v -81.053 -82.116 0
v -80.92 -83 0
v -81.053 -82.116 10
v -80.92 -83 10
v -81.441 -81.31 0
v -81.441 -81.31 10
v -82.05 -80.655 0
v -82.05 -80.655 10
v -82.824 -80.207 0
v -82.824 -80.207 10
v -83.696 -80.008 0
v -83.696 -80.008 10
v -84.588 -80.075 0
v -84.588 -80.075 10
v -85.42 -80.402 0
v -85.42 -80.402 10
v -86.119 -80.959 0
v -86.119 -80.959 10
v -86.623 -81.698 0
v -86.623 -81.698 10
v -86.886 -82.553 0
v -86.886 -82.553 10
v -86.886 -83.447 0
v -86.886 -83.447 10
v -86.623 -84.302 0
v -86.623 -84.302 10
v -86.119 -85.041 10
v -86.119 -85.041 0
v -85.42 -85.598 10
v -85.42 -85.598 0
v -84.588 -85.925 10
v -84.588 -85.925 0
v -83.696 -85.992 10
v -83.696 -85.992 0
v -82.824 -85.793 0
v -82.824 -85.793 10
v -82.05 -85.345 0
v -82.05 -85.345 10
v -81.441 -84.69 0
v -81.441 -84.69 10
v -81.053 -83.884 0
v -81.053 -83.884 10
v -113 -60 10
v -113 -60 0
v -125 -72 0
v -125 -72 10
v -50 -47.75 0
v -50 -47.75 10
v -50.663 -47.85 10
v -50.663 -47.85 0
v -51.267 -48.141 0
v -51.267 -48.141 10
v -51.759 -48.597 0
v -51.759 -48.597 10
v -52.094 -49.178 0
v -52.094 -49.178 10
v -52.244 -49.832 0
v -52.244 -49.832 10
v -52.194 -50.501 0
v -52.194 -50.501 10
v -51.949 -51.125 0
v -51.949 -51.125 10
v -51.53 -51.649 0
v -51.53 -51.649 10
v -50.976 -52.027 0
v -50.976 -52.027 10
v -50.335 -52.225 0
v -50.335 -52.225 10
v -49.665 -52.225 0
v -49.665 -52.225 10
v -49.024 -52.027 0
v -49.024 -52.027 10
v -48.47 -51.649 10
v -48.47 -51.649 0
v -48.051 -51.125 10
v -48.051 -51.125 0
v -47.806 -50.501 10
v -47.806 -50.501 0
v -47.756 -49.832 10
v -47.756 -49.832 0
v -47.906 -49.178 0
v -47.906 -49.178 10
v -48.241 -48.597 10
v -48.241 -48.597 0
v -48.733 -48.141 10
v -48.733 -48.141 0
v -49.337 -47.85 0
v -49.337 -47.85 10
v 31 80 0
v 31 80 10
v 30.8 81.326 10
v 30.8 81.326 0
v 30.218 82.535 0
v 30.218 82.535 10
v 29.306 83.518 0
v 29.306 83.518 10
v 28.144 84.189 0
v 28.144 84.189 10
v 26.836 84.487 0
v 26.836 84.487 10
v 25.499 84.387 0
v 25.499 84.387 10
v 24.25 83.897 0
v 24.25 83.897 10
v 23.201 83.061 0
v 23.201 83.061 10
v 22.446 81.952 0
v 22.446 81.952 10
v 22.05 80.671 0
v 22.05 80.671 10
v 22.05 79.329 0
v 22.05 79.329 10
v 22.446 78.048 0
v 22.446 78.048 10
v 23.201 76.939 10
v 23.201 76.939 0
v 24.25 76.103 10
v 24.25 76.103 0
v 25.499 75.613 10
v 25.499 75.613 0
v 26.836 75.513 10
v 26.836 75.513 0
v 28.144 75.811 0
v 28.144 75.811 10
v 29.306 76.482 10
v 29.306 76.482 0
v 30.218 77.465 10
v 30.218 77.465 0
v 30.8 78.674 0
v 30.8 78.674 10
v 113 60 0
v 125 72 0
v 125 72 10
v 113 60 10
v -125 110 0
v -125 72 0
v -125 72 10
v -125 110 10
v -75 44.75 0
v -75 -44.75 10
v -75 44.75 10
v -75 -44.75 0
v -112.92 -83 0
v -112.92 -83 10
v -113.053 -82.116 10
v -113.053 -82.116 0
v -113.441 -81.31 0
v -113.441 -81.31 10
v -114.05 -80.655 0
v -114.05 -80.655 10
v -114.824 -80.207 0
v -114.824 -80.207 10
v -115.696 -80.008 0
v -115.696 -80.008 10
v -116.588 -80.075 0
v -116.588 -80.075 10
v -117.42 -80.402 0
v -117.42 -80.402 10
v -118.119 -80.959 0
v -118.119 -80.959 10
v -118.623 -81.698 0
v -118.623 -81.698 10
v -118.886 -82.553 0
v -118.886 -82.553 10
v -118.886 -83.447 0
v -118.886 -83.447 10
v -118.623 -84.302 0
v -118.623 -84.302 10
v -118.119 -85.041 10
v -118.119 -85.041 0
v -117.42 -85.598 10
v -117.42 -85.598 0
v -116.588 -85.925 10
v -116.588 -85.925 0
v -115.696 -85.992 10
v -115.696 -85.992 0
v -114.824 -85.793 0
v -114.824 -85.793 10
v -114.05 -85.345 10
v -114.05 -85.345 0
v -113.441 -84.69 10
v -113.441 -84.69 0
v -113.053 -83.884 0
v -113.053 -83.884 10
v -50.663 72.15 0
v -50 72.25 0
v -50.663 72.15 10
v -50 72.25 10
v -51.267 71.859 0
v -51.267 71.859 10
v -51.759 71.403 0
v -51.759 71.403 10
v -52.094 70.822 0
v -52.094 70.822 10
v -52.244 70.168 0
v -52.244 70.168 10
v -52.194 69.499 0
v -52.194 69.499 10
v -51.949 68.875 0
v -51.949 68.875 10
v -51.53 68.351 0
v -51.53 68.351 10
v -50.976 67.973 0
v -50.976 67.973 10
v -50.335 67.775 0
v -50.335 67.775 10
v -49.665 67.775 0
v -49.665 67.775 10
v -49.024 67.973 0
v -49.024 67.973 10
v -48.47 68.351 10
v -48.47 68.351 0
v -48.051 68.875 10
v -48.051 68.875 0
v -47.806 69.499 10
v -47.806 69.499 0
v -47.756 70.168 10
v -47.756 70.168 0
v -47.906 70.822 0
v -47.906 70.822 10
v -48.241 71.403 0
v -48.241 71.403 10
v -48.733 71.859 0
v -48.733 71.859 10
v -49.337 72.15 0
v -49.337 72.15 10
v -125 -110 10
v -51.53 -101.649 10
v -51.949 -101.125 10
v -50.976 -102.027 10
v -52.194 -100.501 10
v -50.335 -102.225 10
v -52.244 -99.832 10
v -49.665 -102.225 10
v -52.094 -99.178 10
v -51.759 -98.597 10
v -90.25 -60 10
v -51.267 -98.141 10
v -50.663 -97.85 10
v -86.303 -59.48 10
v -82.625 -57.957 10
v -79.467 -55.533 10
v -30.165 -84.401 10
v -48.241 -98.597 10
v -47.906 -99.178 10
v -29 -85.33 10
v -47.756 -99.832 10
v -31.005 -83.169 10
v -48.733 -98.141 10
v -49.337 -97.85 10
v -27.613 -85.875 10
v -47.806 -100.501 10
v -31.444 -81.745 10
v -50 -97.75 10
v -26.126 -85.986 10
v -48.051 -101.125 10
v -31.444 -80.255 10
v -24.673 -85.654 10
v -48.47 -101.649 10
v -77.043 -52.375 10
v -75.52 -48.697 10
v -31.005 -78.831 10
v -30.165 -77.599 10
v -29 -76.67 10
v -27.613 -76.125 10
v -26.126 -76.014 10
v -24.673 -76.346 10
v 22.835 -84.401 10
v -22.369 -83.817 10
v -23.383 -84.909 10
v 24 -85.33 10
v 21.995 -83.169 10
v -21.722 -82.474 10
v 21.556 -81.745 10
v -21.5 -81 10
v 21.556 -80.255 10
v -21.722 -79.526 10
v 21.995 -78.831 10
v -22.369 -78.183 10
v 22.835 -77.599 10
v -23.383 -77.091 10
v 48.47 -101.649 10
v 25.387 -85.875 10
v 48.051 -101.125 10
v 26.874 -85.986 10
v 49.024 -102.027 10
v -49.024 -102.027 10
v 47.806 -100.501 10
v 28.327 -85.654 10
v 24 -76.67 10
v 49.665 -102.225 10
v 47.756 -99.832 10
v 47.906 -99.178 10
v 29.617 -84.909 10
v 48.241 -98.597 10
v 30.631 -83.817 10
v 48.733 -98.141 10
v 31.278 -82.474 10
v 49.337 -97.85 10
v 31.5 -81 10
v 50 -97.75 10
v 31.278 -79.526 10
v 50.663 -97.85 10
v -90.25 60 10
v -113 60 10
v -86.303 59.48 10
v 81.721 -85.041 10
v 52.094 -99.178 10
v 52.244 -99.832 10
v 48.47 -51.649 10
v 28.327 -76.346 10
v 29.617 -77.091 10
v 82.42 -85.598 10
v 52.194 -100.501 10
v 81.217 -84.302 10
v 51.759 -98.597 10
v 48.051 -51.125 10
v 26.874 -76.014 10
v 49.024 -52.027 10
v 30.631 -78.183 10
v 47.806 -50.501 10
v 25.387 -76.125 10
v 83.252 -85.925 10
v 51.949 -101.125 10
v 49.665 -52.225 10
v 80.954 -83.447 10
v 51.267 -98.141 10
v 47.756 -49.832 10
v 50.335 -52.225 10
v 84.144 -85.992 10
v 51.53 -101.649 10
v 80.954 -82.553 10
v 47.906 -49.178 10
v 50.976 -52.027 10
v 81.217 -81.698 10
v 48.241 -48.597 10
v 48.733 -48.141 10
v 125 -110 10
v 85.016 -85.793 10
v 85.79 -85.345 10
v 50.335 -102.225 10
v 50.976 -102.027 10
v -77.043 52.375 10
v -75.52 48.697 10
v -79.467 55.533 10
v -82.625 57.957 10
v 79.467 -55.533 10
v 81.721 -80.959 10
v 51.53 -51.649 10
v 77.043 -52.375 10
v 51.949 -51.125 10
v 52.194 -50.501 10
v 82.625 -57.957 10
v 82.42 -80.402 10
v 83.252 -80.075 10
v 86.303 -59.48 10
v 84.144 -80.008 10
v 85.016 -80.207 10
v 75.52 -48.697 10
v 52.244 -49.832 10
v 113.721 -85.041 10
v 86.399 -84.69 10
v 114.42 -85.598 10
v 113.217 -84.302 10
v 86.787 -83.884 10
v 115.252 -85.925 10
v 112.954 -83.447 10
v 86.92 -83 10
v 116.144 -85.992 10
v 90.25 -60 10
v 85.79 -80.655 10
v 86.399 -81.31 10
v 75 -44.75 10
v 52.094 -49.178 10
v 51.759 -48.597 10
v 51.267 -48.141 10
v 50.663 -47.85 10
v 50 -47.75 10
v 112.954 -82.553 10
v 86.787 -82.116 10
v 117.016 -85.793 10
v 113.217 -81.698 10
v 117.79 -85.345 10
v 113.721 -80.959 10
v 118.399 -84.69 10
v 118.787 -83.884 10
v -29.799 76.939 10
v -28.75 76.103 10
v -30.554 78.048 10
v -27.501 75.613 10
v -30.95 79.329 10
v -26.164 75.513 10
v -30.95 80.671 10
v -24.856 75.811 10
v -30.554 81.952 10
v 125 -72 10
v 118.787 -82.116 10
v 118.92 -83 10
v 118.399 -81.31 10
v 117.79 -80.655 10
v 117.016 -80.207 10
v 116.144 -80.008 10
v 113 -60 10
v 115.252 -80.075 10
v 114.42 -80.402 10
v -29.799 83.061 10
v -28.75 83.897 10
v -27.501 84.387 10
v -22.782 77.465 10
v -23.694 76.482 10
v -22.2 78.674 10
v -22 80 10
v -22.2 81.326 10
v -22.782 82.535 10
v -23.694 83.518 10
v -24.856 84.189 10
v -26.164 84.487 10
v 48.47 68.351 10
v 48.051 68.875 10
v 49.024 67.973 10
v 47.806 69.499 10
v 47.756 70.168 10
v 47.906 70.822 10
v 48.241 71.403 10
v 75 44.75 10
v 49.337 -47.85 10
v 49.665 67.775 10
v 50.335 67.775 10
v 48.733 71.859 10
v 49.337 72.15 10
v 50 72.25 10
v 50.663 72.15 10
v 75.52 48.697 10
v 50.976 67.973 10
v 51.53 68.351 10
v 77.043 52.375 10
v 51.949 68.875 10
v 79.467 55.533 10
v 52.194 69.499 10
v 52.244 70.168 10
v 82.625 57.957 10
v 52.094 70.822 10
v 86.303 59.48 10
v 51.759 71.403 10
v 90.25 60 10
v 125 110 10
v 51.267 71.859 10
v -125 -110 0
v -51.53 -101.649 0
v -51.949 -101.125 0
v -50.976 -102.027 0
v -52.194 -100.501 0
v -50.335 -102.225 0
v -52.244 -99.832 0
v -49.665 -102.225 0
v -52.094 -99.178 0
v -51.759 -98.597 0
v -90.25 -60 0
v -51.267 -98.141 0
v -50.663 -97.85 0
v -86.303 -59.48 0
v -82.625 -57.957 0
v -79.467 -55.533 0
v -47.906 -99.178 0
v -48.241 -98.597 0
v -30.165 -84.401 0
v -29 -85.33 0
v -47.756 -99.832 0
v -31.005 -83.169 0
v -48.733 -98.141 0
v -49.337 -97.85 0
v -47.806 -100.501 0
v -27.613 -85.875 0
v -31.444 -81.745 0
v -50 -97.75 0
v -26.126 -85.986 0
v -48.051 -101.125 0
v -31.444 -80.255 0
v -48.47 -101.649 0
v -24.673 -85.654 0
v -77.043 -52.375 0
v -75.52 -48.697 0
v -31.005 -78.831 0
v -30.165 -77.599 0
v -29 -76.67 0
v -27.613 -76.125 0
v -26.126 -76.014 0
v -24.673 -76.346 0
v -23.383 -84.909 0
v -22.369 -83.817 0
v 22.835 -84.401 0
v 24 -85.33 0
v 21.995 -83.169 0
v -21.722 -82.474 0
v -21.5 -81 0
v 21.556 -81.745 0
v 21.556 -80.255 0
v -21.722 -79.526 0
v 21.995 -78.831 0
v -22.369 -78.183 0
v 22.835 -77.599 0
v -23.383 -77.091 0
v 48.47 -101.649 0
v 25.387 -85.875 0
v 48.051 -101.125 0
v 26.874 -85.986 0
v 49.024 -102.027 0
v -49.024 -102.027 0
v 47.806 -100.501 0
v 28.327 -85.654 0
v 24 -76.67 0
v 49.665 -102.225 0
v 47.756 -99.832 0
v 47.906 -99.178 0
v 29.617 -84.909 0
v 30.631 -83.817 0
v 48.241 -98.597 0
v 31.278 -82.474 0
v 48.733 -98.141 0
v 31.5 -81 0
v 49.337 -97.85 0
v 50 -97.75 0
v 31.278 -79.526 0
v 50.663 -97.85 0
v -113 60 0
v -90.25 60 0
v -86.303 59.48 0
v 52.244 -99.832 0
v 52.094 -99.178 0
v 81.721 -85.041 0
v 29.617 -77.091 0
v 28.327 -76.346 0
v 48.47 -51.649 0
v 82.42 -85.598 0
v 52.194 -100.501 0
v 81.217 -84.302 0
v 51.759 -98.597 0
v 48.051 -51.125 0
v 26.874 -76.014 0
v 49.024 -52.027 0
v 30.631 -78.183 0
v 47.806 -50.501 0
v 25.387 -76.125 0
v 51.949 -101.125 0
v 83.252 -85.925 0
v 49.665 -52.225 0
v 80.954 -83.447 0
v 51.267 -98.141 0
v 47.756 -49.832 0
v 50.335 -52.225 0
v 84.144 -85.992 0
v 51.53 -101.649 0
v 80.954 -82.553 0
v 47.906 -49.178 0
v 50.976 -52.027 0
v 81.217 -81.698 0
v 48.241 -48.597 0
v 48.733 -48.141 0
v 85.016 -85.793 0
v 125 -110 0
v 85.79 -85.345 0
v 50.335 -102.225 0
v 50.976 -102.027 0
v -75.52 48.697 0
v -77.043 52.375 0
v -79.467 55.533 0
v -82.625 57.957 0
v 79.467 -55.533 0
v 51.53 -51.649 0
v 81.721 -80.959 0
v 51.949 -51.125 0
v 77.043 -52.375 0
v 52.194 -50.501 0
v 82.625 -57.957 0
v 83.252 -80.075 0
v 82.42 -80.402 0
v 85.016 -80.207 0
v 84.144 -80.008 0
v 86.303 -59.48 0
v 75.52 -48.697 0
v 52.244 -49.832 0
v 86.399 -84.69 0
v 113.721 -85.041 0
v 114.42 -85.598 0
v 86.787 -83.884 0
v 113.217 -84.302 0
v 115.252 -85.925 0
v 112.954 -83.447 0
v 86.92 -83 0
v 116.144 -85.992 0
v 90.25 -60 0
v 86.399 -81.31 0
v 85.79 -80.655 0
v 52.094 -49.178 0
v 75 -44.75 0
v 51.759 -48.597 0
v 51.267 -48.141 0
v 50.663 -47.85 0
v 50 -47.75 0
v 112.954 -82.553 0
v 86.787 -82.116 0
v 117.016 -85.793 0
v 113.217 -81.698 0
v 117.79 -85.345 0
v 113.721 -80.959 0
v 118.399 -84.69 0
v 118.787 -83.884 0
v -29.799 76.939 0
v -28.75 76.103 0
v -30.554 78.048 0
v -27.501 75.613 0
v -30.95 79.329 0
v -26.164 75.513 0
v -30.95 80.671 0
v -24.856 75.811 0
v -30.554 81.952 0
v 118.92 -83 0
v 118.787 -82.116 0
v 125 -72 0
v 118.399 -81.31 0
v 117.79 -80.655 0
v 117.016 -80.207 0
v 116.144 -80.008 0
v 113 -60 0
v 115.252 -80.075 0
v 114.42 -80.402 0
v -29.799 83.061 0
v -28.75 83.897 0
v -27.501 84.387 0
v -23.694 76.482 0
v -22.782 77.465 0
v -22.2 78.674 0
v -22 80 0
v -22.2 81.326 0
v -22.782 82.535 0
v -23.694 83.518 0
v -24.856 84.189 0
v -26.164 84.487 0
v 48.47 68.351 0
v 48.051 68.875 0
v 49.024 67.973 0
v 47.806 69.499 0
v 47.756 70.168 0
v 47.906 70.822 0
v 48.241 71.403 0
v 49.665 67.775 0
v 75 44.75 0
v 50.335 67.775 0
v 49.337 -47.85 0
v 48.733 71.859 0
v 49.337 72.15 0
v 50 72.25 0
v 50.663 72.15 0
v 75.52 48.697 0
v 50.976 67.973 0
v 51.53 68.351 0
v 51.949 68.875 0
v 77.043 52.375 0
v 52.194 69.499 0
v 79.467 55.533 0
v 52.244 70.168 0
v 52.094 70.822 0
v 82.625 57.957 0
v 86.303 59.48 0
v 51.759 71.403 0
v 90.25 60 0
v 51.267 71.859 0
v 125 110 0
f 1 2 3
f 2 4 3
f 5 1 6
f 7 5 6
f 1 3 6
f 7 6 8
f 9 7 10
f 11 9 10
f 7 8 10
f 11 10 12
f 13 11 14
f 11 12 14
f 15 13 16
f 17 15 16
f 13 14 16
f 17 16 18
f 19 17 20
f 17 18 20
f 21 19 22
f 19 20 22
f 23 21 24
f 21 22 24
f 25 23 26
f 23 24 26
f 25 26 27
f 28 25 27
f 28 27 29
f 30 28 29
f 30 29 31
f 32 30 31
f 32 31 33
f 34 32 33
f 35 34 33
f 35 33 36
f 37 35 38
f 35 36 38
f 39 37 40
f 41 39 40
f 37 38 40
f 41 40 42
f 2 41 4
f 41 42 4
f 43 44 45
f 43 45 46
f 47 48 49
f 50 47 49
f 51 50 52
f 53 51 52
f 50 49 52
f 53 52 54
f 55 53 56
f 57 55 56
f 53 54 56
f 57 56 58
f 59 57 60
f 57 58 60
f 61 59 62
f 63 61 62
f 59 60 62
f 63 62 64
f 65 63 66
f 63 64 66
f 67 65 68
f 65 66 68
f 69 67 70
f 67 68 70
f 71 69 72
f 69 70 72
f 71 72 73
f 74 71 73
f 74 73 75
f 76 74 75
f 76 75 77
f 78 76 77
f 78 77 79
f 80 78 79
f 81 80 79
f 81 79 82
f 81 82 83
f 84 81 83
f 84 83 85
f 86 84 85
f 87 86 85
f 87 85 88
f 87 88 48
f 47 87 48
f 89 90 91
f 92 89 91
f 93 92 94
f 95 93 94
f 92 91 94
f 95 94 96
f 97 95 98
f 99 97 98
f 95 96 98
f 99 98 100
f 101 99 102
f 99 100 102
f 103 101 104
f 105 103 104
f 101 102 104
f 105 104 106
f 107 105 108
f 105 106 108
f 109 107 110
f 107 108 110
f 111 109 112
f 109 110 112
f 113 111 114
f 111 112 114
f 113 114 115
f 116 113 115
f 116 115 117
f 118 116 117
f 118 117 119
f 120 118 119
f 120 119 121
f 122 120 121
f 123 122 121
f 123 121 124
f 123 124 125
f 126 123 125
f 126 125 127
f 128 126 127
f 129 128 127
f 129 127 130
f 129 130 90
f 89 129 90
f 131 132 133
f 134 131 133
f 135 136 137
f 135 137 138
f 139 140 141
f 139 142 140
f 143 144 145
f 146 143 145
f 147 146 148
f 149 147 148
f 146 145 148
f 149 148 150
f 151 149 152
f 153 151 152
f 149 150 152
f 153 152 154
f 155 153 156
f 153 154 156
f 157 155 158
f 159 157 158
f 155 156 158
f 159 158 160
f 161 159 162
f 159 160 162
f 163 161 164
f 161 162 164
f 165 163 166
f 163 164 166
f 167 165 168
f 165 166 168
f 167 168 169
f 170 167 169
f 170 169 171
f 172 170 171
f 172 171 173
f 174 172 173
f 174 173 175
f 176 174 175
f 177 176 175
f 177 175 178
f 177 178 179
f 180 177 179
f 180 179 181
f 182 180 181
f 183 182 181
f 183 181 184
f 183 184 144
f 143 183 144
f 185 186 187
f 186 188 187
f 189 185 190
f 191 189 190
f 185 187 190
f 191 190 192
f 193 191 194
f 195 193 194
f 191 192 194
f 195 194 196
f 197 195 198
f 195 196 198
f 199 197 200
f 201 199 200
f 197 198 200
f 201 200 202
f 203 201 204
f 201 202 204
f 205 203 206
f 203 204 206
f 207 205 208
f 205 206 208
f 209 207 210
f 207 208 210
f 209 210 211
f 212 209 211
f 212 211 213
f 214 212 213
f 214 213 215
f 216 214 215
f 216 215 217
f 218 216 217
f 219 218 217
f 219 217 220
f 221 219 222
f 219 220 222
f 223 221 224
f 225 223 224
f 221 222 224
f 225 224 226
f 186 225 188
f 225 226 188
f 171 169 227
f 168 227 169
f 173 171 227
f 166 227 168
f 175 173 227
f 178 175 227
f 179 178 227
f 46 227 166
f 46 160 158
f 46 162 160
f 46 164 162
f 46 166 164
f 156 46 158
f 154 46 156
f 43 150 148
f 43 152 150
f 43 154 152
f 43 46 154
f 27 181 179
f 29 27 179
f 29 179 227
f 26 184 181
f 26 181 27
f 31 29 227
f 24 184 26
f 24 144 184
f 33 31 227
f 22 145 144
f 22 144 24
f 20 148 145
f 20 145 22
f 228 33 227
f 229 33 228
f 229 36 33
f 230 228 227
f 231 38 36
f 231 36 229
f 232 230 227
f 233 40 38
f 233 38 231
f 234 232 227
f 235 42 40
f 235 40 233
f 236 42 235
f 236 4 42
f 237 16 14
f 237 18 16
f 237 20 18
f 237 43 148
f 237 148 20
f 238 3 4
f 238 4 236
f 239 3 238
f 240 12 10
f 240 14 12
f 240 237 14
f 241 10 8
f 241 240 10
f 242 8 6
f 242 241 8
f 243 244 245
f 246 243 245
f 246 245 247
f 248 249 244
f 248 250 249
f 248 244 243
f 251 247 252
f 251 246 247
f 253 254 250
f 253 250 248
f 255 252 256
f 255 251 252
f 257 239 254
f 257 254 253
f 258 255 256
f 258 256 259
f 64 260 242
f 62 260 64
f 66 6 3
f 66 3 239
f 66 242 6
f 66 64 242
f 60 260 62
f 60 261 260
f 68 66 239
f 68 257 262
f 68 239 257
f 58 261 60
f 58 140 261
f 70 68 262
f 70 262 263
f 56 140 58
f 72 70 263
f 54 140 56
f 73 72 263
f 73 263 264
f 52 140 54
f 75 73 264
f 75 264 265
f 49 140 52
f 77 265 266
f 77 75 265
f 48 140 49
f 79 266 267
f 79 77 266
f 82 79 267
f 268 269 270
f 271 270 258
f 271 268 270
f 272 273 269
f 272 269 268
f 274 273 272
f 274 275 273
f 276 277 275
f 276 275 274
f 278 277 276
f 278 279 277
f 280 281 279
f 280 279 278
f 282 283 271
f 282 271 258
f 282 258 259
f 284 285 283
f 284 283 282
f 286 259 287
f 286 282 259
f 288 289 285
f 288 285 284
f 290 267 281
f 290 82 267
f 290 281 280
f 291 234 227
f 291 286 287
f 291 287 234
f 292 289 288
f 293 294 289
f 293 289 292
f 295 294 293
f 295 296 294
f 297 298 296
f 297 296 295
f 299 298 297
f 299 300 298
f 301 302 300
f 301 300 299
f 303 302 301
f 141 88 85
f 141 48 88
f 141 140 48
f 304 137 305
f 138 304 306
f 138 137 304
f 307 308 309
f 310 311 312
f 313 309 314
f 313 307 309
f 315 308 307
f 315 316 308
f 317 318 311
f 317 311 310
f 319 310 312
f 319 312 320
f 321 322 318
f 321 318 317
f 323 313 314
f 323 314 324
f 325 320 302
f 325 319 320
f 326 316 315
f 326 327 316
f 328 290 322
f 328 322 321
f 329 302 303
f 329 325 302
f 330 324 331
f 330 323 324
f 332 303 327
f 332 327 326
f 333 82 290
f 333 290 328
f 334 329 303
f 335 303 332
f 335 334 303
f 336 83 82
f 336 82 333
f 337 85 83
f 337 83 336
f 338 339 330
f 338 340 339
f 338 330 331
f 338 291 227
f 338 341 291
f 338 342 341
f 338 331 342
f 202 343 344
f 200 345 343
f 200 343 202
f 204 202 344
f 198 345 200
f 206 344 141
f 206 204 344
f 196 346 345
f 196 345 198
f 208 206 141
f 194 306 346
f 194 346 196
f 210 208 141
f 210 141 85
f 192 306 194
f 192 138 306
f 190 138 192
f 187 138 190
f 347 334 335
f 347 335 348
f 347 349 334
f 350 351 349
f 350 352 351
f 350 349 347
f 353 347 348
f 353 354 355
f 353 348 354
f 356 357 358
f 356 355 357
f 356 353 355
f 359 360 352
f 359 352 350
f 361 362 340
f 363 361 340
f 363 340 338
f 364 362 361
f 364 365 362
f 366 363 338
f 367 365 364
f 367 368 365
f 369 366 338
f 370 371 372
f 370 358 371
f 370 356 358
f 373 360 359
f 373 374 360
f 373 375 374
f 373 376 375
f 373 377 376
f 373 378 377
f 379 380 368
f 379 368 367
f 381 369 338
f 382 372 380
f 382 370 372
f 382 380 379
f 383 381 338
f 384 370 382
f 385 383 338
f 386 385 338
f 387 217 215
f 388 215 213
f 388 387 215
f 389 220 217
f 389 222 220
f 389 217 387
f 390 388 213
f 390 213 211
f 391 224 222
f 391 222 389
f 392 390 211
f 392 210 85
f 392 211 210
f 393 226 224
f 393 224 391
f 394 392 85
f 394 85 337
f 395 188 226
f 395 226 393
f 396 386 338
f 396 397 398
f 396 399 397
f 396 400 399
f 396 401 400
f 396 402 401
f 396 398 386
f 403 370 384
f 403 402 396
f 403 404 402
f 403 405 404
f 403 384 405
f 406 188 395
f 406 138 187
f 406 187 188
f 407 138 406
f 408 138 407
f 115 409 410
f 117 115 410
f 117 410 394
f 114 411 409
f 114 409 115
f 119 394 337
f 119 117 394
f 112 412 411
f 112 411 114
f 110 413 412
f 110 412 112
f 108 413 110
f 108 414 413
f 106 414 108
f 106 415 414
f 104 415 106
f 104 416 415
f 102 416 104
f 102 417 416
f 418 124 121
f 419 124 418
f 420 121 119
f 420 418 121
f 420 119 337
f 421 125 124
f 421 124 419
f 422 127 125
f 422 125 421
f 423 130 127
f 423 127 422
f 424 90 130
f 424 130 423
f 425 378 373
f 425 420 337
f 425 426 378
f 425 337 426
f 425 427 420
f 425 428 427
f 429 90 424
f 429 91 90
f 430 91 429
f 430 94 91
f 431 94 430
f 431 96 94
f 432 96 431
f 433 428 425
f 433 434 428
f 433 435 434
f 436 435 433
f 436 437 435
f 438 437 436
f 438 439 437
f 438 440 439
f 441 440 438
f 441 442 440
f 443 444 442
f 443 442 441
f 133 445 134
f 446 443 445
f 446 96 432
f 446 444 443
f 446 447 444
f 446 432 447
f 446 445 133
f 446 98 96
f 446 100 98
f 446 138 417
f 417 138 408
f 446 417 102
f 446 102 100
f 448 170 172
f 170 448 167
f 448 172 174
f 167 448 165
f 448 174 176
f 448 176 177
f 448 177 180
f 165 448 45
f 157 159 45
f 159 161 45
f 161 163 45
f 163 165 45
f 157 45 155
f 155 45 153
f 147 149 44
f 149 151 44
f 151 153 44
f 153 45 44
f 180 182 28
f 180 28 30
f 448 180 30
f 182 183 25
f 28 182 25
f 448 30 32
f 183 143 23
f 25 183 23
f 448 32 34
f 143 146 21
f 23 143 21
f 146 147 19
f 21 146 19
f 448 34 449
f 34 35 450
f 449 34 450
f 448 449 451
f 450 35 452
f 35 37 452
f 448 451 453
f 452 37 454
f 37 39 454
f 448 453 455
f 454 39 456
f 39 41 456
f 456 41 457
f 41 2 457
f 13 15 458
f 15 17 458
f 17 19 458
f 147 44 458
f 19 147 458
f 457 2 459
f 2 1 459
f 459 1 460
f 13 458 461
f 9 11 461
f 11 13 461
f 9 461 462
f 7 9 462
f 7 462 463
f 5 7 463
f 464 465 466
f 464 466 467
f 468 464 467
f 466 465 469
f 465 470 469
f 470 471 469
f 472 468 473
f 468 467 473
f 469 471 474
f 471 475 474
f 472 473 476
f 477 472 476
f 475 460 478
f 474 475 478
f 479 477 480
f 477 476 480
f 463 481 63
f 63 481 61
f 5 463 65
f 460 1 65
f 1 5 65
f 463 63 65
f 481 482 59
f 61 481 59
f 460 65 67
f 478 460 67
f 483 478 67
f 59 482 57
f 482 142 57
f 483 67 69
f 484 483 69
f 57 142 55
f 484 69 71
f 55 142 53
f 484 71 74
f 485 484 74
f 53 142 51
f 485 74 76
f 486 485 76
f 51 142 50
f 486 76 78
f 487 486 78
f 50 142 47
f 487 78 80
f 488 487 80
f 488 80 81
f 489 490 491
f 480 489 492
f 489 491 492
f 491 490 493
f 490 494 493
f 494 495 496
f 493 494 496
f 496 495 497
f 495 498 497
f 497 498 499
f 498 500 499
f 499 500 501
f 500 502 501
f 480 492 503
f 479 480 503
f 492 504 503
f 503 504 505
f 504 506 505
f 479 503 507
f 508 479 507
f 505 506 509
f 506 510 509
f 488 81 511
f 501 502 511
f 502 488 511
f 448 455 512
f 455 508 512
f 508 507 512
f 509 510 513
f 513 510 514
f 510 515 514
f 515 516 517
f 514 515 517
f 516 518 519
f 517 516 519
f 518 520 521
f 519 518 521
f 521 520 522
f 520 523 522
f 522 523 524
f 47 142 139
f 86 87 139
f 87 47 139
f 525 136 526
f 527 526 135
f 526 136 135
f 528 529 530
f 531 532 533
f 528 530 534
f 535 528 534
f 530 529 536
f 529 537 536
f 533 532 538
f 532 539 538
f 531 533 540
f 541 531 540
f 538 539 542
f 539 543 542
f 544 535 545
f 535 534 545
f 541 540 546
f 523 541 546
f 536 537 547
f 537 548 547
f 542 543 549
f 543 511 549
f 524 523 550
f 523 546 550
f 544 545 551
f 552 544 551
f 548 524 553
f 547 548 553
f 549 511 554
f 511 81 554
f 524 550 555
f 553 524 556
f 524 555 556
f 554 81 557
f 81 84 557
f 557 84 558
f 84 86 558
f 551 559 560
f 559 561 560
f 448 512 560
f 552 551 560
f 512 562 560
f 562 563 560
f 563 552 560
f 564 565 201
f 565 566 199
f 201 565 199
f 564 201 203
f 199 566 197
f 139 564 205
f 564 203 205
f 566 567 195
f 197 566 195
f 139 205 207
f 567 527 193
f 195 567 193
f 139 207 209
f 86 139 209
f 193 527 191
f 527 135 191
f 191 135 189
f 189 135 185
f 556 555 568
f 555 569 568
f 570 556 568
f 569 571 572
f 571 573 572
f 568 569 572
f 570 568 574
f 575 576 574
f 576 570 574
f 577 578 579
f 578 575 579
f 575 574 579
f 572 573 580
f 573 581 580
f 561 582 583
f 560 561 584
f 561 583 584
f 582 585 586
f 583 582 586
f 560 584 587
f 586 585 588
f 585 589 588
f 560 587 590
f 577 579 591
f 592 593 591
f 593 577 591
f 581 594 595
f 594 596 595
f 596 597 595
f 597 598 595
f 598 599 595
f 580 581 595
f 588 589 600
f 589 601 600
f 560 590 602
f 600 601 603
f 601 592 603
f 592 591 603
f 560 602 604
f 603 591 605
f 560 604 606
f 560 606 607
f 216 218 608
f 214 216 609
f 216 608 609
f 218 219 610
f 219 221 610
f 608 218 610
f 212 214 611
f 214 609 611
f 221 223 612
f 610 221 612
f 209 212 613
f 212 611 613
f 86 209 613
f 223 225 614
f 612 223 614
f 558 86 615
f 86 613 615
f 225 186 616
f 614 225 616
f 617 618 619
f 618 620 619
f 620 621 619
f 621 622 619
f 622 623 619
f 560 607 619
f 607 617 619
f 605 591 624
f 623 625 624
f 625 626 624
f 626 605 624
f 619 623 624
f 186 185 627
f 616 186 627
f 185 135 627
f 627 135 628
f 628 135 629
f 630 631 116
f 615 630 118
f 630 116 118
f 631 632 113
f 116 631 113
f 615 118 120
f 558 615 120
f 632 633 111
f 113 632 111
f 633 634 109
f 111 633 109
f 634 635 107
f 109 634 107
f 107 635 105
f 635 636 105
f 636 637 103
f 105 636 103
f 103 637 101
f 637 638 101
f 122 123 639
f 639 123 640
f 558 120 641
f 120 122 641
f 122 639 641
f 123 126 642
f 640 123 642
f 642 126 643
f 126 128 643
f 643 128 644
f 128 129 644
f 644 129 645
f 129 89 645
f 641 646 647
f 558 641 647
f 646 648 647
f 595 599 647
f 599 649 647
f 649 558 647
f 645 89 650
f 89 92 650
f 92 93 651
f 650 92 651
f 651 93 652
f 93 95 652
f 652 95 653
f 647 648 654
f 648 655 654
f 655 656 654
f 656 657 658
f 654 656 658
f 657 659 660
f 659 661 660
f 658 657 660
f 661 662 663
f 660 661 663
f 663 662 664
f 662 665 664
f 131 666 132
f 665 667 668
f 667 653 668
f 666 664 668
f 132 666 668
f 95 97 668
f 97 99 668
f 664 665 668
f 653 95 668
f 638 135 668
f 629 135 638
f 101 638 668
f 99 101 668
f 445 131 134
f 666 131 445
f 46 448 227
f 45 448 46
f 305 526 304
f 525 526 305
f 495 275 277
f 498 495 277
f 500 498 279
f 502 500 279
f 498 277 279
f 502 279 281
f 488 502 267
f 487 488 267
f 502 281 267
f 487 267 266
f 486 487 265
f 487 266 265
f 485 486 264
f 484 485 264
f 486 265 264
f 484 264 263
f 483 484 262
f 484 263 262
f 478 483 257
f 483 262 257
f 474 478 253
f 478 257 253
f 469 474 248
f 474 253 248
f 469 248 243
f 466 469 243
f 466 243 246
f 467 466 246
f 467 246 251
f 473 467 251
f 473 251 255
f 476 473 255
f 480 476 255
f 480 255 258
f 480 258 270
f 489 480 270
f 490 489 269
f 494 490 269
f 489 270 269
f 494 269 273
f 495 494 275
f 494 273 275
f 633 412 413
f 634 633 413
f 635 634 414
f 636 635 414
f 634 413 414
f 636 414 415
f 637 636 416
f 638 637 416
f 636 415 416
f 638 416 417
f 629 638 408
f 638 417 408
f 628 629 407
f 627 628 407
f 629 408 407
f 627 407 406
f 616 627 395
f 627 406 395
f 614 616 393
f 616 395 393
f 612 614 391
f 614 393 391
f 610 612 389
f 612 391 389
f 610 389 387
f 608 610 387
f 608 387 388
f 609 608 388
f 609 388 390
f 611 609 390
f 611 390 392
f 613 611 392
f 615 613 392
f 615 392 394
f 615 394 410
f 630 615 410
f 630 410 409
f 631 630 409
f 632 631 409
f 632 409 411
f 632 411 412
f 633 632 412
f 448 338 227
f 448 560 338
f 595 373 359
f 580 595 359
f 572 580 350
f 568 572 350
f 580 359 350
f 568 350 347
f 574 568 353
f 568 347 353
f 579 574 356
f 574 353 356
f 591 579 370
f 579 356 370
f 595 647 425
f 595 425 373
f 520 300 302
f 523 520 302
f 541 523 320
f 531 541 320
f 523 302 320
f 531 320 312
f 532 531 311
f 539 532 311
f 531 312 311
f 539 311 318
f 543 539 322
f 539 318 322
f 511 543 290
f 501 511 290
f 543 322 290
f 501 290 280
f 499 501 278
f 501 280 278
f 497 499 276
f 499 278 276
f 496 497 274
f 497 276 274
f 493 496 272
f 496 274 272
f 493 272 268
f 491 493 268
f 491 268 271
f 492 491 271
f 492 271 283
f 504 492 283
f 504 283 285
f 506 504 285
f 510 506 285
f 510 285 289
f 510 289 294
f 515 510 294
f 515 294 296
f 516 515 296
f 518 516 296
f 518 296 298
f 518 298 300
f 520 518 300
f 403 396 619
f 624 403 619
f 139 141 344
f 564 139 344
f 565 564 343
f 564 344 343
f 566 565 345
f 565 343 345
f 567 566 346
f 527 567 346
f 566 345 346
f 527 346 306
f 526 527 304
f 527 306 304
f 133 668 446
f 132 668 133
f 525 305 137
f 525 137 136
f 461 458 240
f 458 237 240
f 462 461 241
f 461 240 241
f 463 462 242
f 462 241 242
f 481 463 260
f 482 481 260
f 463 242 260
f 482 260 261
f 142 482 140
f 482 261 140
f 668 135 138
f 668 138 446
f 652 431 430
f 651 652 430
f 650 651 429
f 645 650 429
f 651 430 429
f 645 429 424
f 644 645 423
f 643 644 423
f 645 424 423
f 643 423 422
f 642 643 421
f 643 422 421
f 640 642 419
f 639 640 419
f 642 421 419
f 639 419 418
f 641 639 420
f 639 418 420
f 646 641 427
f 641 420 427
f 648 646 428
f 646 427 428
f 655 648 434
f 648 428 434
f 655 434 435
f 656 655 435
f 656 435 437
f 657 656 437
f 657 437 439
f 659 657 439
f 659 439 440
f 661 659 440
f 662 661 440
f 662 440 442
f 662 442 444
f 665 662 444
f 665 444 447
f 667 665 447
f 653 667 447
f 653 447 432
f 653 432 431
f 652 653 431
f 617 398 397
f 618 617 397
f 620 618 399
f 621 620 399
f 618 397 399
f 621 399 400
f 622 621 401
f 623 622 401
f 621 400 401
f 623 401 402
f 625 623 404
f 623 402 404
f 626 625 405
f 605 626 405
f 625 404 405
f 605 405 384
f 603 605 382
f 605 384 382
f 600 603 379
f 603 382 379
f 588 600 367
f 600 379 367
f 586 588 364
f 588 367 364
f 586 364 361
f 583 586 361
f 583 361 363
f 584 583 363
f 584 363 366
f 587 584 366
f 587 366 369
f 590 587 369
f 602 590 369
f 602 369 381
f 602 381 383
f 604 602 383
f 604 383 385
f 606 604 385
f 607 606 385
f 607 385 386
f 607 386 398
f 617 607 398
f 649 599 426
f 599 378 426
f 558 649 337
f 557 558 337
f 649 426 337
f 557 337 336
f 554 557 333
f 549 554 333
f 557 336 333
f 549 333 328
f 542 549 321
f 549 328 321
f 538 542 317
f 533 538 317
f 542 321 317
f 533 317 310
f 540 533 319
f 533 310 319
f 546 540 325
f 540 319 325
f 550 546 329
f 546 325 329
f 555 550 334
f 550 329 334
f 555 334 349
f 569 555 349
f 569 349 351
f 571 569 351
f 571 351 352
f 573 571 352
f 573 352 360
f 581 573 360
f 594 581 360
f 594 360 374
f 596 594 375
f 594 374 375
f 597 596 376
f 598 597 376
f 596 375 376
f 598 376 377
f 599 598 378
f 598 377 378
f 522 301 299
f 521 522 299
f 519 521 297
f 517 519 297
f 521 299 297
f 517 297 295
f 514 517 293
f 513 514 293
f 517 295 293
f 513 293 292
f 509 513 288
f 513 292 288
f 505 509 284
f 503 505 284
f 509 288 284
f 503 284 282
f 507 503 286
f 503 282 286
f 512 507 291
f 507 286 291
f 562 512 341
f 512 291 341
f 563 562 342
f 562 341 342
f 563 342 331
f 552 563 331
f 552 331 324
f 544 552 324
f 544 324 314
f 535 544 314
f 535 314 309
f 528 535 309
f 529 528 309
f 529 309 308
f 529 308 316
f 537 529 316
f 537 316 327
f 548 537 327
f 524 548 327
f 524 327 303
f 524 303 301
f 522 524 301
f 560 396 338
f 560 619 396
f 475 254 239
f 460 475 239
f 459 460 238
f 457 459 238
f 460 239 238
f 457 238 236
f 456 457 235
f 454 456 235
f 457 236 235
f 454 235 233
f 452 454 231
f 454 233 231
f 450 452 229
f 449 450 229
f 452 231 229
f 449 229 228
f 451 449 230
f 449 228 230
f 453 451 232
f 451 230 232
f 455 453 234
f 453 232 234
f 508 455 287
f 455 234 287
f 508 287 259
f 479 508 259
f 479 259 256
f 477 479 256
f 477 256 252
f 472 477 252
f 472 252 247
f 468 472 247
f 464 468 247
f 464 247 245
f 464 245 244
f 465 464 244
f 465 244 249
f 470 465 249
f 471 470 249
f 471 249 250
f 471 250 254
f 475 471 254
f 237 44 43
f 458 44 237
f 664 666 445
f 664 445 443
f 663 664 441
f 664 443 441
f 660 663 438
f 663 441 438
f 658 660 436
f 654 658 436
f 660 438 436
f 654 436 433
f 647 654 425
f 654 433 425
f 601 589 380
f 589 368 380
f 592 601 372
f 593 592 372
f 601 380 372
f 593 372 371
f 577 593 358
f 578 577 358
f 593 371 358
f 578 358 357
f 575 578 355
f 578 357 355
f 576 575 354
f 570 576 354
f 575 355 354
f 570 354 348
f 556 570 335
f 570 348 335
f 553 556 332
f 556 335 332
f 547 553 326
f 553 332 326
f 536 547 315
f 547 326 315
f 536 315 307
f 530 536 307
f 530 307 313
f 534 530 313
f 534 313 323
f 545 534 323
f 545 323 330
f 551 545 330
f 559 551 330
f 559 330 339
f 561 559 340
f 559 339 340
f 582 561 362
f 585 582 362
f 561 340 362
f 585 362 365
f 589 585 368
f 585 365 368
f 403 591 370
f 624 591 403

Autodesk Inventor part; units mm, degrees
ref_plane "YZ Plane" through (0, 0, 0) normal (1, 0, 0) x (0, 1, 0)
ref_plane "XZ Plane" through (0, 0, 0) normal (0, 1, 0) x (-1, 0, 0)
ref_plane "XY Plane" through (0, 0, 0) normal (0, 0, 1) x (1, 0, 0)
sketch "Sketch1" plane through (0, 0, 0) normal (0, 0, 1) x (1, 0, 0)
  line L0 (-125, -110) -> (-125, 110)
  line L1 (-125, 110) -> (125, 110)
  line L2 (125, 110) -> (125, -110)
  line L3 (125, -110) -> (-125, -110)
  line L4 (-125, -110) -> (125, 110) construction
  line L5 (-125, 110) -> (125, -110) construction
  point P0 (0, 0)
  dimension "d0" = 220
  dimension "d1" = 250
extrude "Extrusion1" add sketch "Sketch1" along normal blind 10
sketch "Sketch2" plane through (0, 0, 0) normal (0, 0, -1) x (-1, 0, 0)
  line L0 (50, 100) -> (-50, 100)
  line L1 (-50, 100) -> (-50, -100)
  line L2 (-50, -100) -> (50, -100)
  line L3 (50, -100) -> (50, 100)
  line L4 (50, 100) -> (-50, -100) construction
  line L5 (-50, 100) -> (50, -100) construction
  line L6 (-125, -110) -> (-125, 110) projected
  line L7 (125, -110) -> (-125, -110) projected
  point P0 (0, 0)
  point P1 (50, -50)
  point P2 (50, 70)
  point P3 (-50, -50)
  point P4 (-50, 70)
  dimension "d4" = 75
  dimension "d5" = 10
  dimension "d6" = 50
  dimension "d7" = 30
hole "Hole1" at (-50, -50, 0) at (-50, 70, 0) at (50, -50, 0) at (50, 70, 0) at (50, -100, 0) at (-50, -100, 0) direction (0, 0, 1) diameter 4.5 end through all
sketch "Sketch3" plane through (0, 0, 10) normal (0, 0, 1) x (1, 0, 0)
  line L0 (109.42, -76) -> (119.92, -76) projected
  line L1 (109.42, -76) -> (109.42, -90) projected
  line L2 (109.42, -90) -> (119.92, -90) projected
  line L3 (119.92, -90) -> (119.92, -76) projected
  circle A0 centre (115.92, -83) radius 3 projected
  line L4 (79.92, -90) -> (90.42, -90) projected
  line L5 (90.42, -90) -> (90.42, -76) projected
  line L6 (79.92, -76) -> (90.42, -76) projected
  line L7 (79.92, -76) -> (79.92, -90) projected
  circle A1 centre (83.92, -83) radius 3 projected
  line L8 (34, -69) -> (34, -93) projected
  line L9 (18, -69) -> (34, -69) projected
  line L10 (18, -93) -> (18, -69) projected
  line L11 (34, -93) -> (18, -93) projected
  circle A2 centre (26.5, -81) radius 5 projected
  circle A3 centre (-26.5, -81) radius 5 projected
  line L12 (-34, -93) -> (-34, -69) projected
  line L13 (-18, -93) -> (-34, -93) projected
  line L14 (-18, -93) -> (-18, -69) projected
  line L15 (-34, -69) -> (-18, -69) projected
  circle A4 centre (-26.5, -81) radius 5 projected
  line L16 (-79.92, -76) -> (-90.42, -76) projected
  line L17 (-90.42, -76) -> (-90.42, -90) projected
  line L18 (-79.92, -90) -> (-90.42, -90) projected
  line L19 (-79.92, -90) -> (-79.92, -76) projected
  circle A5 centre (-83.92, -83) radius 3 projected
  line L20 (-109.42, -90) -> (-119.92, -90) projected
  line L21 (-109.42, -90) -> (-109.42, -76) projected
  line L22 (-109.42, -76) -> (-119.92, -76) projected
  line L23 (-119.92, -76) -> (-119.92, -90) projected
  circle A6 centre (-115.92, -83) radius 3 projected
  line L24 (-34, 70) -> (-34, 90) projected
  line L25 (-18, 70) -> (-34, 70) projected
  line L26 (-18, 90) -> (-18, 70) projected
  line L27 (-34, 90) -> (-18, 90) projected
  circle A7 centre (-26.5, 80) radius 4.5 projected
  line L28 (34, 90) -> (34, 70) projected
  line L29 (18, 90) -> (34, 90) projected
  line L30 (18, 90) -> (18, 70) projected
  line L31 (34, 70) -> (18, 70) projected
  circle A8 centre (26.5, 80) radius 4.5 projected
  point P0 (0, 0)
extrude "Extrusion2" cut sketch "Sketch3" against normal blind 10 contours A0 | A1 | A2 | A3 | A5 | A6 | A7 | A8
sketch "Sketch4" plane through (0, 0, 0) normal (0, 0, -1) x (-1, 0, 0)
  circle A0 centre (-83.92, -83) radius 3 projected
  circle A1 centre (115.92, -83) radius 3 projected
  circle A2 centre (26.5, 80) radius 4.5 projected
  circle A3 centre (-26.5, -81) radius 5 projected
  circle A4 centre (-115.92, -83) radius 3 projected
  circle A5 centre (83.92, -83) radius 3 projected
  circle A6 centre (-26.5, 80) radius 4.5 projected
  circle A7 centre (26.5, -81) radius 5 projected
  circle A8 centre (-50, -100) radius 2.25 projected
  circle A9 centre (-50, -50) radius 2.25 projected
  circle A10 centre (50, -50) radius 2.25 projected
  circle A11 centre (50, 70) radius 2.25 projected
  circle A12 centre (-50, 70) radius 2.25 projected
  circle A13 centre (50, -100) radius 2.25 projected
  line L0 (-125, -110) -> (-125, 110) projected
  line L1 (125, -110) -> (-125, -110) projected
  line L2 (125, 110) -> (125, -110) projected
  line L3 (-125, 110) -> (125, 110) projected
  line L4 (-175, 60) -> (-75, 60)
  line L5 (-75, 60) -> (-75, -60)
  line L6 (-75, -60) -> (-175, -60)
  line L7 (-175, -60) -> (-175, 60)
  line L8 (-125, -110) -> (-125, 110) projected
  line L9 (-175, 60) -> (-75, -60) construction
  line L10 (-75, 60) -> (-175, -60) construction
  point P0 (0, 0)
  point P1 (-125, 0)
  point P2 (-125, 60)
  point P3 (-125, -60)
  dimension "d17" = 100
  dimension "d18" = 120
extrude "Extrusion3" cut sketch "Sketch4" against normal blind 67.5 contours L0 L4 L5 L6
mirror "Mirror1" about plane through (0, 0, 0) normal (1, 0, 0) of "Extrusion3"
fillet "Fillet1" radius 15.25 4 edges at (75, -60, 5) (75, 60, 5) (-75, -60, 5) (-75, 60, 5)
chamfer "Chamfer1" distance 12 angle 45 4 edges at (125, -60, 5) (125, 60, 5) (-125, 60, 5) (-125, -60, 5)
properties part number "08_Tam_truc_Z" material "Stainless Steel, Austenitic"
